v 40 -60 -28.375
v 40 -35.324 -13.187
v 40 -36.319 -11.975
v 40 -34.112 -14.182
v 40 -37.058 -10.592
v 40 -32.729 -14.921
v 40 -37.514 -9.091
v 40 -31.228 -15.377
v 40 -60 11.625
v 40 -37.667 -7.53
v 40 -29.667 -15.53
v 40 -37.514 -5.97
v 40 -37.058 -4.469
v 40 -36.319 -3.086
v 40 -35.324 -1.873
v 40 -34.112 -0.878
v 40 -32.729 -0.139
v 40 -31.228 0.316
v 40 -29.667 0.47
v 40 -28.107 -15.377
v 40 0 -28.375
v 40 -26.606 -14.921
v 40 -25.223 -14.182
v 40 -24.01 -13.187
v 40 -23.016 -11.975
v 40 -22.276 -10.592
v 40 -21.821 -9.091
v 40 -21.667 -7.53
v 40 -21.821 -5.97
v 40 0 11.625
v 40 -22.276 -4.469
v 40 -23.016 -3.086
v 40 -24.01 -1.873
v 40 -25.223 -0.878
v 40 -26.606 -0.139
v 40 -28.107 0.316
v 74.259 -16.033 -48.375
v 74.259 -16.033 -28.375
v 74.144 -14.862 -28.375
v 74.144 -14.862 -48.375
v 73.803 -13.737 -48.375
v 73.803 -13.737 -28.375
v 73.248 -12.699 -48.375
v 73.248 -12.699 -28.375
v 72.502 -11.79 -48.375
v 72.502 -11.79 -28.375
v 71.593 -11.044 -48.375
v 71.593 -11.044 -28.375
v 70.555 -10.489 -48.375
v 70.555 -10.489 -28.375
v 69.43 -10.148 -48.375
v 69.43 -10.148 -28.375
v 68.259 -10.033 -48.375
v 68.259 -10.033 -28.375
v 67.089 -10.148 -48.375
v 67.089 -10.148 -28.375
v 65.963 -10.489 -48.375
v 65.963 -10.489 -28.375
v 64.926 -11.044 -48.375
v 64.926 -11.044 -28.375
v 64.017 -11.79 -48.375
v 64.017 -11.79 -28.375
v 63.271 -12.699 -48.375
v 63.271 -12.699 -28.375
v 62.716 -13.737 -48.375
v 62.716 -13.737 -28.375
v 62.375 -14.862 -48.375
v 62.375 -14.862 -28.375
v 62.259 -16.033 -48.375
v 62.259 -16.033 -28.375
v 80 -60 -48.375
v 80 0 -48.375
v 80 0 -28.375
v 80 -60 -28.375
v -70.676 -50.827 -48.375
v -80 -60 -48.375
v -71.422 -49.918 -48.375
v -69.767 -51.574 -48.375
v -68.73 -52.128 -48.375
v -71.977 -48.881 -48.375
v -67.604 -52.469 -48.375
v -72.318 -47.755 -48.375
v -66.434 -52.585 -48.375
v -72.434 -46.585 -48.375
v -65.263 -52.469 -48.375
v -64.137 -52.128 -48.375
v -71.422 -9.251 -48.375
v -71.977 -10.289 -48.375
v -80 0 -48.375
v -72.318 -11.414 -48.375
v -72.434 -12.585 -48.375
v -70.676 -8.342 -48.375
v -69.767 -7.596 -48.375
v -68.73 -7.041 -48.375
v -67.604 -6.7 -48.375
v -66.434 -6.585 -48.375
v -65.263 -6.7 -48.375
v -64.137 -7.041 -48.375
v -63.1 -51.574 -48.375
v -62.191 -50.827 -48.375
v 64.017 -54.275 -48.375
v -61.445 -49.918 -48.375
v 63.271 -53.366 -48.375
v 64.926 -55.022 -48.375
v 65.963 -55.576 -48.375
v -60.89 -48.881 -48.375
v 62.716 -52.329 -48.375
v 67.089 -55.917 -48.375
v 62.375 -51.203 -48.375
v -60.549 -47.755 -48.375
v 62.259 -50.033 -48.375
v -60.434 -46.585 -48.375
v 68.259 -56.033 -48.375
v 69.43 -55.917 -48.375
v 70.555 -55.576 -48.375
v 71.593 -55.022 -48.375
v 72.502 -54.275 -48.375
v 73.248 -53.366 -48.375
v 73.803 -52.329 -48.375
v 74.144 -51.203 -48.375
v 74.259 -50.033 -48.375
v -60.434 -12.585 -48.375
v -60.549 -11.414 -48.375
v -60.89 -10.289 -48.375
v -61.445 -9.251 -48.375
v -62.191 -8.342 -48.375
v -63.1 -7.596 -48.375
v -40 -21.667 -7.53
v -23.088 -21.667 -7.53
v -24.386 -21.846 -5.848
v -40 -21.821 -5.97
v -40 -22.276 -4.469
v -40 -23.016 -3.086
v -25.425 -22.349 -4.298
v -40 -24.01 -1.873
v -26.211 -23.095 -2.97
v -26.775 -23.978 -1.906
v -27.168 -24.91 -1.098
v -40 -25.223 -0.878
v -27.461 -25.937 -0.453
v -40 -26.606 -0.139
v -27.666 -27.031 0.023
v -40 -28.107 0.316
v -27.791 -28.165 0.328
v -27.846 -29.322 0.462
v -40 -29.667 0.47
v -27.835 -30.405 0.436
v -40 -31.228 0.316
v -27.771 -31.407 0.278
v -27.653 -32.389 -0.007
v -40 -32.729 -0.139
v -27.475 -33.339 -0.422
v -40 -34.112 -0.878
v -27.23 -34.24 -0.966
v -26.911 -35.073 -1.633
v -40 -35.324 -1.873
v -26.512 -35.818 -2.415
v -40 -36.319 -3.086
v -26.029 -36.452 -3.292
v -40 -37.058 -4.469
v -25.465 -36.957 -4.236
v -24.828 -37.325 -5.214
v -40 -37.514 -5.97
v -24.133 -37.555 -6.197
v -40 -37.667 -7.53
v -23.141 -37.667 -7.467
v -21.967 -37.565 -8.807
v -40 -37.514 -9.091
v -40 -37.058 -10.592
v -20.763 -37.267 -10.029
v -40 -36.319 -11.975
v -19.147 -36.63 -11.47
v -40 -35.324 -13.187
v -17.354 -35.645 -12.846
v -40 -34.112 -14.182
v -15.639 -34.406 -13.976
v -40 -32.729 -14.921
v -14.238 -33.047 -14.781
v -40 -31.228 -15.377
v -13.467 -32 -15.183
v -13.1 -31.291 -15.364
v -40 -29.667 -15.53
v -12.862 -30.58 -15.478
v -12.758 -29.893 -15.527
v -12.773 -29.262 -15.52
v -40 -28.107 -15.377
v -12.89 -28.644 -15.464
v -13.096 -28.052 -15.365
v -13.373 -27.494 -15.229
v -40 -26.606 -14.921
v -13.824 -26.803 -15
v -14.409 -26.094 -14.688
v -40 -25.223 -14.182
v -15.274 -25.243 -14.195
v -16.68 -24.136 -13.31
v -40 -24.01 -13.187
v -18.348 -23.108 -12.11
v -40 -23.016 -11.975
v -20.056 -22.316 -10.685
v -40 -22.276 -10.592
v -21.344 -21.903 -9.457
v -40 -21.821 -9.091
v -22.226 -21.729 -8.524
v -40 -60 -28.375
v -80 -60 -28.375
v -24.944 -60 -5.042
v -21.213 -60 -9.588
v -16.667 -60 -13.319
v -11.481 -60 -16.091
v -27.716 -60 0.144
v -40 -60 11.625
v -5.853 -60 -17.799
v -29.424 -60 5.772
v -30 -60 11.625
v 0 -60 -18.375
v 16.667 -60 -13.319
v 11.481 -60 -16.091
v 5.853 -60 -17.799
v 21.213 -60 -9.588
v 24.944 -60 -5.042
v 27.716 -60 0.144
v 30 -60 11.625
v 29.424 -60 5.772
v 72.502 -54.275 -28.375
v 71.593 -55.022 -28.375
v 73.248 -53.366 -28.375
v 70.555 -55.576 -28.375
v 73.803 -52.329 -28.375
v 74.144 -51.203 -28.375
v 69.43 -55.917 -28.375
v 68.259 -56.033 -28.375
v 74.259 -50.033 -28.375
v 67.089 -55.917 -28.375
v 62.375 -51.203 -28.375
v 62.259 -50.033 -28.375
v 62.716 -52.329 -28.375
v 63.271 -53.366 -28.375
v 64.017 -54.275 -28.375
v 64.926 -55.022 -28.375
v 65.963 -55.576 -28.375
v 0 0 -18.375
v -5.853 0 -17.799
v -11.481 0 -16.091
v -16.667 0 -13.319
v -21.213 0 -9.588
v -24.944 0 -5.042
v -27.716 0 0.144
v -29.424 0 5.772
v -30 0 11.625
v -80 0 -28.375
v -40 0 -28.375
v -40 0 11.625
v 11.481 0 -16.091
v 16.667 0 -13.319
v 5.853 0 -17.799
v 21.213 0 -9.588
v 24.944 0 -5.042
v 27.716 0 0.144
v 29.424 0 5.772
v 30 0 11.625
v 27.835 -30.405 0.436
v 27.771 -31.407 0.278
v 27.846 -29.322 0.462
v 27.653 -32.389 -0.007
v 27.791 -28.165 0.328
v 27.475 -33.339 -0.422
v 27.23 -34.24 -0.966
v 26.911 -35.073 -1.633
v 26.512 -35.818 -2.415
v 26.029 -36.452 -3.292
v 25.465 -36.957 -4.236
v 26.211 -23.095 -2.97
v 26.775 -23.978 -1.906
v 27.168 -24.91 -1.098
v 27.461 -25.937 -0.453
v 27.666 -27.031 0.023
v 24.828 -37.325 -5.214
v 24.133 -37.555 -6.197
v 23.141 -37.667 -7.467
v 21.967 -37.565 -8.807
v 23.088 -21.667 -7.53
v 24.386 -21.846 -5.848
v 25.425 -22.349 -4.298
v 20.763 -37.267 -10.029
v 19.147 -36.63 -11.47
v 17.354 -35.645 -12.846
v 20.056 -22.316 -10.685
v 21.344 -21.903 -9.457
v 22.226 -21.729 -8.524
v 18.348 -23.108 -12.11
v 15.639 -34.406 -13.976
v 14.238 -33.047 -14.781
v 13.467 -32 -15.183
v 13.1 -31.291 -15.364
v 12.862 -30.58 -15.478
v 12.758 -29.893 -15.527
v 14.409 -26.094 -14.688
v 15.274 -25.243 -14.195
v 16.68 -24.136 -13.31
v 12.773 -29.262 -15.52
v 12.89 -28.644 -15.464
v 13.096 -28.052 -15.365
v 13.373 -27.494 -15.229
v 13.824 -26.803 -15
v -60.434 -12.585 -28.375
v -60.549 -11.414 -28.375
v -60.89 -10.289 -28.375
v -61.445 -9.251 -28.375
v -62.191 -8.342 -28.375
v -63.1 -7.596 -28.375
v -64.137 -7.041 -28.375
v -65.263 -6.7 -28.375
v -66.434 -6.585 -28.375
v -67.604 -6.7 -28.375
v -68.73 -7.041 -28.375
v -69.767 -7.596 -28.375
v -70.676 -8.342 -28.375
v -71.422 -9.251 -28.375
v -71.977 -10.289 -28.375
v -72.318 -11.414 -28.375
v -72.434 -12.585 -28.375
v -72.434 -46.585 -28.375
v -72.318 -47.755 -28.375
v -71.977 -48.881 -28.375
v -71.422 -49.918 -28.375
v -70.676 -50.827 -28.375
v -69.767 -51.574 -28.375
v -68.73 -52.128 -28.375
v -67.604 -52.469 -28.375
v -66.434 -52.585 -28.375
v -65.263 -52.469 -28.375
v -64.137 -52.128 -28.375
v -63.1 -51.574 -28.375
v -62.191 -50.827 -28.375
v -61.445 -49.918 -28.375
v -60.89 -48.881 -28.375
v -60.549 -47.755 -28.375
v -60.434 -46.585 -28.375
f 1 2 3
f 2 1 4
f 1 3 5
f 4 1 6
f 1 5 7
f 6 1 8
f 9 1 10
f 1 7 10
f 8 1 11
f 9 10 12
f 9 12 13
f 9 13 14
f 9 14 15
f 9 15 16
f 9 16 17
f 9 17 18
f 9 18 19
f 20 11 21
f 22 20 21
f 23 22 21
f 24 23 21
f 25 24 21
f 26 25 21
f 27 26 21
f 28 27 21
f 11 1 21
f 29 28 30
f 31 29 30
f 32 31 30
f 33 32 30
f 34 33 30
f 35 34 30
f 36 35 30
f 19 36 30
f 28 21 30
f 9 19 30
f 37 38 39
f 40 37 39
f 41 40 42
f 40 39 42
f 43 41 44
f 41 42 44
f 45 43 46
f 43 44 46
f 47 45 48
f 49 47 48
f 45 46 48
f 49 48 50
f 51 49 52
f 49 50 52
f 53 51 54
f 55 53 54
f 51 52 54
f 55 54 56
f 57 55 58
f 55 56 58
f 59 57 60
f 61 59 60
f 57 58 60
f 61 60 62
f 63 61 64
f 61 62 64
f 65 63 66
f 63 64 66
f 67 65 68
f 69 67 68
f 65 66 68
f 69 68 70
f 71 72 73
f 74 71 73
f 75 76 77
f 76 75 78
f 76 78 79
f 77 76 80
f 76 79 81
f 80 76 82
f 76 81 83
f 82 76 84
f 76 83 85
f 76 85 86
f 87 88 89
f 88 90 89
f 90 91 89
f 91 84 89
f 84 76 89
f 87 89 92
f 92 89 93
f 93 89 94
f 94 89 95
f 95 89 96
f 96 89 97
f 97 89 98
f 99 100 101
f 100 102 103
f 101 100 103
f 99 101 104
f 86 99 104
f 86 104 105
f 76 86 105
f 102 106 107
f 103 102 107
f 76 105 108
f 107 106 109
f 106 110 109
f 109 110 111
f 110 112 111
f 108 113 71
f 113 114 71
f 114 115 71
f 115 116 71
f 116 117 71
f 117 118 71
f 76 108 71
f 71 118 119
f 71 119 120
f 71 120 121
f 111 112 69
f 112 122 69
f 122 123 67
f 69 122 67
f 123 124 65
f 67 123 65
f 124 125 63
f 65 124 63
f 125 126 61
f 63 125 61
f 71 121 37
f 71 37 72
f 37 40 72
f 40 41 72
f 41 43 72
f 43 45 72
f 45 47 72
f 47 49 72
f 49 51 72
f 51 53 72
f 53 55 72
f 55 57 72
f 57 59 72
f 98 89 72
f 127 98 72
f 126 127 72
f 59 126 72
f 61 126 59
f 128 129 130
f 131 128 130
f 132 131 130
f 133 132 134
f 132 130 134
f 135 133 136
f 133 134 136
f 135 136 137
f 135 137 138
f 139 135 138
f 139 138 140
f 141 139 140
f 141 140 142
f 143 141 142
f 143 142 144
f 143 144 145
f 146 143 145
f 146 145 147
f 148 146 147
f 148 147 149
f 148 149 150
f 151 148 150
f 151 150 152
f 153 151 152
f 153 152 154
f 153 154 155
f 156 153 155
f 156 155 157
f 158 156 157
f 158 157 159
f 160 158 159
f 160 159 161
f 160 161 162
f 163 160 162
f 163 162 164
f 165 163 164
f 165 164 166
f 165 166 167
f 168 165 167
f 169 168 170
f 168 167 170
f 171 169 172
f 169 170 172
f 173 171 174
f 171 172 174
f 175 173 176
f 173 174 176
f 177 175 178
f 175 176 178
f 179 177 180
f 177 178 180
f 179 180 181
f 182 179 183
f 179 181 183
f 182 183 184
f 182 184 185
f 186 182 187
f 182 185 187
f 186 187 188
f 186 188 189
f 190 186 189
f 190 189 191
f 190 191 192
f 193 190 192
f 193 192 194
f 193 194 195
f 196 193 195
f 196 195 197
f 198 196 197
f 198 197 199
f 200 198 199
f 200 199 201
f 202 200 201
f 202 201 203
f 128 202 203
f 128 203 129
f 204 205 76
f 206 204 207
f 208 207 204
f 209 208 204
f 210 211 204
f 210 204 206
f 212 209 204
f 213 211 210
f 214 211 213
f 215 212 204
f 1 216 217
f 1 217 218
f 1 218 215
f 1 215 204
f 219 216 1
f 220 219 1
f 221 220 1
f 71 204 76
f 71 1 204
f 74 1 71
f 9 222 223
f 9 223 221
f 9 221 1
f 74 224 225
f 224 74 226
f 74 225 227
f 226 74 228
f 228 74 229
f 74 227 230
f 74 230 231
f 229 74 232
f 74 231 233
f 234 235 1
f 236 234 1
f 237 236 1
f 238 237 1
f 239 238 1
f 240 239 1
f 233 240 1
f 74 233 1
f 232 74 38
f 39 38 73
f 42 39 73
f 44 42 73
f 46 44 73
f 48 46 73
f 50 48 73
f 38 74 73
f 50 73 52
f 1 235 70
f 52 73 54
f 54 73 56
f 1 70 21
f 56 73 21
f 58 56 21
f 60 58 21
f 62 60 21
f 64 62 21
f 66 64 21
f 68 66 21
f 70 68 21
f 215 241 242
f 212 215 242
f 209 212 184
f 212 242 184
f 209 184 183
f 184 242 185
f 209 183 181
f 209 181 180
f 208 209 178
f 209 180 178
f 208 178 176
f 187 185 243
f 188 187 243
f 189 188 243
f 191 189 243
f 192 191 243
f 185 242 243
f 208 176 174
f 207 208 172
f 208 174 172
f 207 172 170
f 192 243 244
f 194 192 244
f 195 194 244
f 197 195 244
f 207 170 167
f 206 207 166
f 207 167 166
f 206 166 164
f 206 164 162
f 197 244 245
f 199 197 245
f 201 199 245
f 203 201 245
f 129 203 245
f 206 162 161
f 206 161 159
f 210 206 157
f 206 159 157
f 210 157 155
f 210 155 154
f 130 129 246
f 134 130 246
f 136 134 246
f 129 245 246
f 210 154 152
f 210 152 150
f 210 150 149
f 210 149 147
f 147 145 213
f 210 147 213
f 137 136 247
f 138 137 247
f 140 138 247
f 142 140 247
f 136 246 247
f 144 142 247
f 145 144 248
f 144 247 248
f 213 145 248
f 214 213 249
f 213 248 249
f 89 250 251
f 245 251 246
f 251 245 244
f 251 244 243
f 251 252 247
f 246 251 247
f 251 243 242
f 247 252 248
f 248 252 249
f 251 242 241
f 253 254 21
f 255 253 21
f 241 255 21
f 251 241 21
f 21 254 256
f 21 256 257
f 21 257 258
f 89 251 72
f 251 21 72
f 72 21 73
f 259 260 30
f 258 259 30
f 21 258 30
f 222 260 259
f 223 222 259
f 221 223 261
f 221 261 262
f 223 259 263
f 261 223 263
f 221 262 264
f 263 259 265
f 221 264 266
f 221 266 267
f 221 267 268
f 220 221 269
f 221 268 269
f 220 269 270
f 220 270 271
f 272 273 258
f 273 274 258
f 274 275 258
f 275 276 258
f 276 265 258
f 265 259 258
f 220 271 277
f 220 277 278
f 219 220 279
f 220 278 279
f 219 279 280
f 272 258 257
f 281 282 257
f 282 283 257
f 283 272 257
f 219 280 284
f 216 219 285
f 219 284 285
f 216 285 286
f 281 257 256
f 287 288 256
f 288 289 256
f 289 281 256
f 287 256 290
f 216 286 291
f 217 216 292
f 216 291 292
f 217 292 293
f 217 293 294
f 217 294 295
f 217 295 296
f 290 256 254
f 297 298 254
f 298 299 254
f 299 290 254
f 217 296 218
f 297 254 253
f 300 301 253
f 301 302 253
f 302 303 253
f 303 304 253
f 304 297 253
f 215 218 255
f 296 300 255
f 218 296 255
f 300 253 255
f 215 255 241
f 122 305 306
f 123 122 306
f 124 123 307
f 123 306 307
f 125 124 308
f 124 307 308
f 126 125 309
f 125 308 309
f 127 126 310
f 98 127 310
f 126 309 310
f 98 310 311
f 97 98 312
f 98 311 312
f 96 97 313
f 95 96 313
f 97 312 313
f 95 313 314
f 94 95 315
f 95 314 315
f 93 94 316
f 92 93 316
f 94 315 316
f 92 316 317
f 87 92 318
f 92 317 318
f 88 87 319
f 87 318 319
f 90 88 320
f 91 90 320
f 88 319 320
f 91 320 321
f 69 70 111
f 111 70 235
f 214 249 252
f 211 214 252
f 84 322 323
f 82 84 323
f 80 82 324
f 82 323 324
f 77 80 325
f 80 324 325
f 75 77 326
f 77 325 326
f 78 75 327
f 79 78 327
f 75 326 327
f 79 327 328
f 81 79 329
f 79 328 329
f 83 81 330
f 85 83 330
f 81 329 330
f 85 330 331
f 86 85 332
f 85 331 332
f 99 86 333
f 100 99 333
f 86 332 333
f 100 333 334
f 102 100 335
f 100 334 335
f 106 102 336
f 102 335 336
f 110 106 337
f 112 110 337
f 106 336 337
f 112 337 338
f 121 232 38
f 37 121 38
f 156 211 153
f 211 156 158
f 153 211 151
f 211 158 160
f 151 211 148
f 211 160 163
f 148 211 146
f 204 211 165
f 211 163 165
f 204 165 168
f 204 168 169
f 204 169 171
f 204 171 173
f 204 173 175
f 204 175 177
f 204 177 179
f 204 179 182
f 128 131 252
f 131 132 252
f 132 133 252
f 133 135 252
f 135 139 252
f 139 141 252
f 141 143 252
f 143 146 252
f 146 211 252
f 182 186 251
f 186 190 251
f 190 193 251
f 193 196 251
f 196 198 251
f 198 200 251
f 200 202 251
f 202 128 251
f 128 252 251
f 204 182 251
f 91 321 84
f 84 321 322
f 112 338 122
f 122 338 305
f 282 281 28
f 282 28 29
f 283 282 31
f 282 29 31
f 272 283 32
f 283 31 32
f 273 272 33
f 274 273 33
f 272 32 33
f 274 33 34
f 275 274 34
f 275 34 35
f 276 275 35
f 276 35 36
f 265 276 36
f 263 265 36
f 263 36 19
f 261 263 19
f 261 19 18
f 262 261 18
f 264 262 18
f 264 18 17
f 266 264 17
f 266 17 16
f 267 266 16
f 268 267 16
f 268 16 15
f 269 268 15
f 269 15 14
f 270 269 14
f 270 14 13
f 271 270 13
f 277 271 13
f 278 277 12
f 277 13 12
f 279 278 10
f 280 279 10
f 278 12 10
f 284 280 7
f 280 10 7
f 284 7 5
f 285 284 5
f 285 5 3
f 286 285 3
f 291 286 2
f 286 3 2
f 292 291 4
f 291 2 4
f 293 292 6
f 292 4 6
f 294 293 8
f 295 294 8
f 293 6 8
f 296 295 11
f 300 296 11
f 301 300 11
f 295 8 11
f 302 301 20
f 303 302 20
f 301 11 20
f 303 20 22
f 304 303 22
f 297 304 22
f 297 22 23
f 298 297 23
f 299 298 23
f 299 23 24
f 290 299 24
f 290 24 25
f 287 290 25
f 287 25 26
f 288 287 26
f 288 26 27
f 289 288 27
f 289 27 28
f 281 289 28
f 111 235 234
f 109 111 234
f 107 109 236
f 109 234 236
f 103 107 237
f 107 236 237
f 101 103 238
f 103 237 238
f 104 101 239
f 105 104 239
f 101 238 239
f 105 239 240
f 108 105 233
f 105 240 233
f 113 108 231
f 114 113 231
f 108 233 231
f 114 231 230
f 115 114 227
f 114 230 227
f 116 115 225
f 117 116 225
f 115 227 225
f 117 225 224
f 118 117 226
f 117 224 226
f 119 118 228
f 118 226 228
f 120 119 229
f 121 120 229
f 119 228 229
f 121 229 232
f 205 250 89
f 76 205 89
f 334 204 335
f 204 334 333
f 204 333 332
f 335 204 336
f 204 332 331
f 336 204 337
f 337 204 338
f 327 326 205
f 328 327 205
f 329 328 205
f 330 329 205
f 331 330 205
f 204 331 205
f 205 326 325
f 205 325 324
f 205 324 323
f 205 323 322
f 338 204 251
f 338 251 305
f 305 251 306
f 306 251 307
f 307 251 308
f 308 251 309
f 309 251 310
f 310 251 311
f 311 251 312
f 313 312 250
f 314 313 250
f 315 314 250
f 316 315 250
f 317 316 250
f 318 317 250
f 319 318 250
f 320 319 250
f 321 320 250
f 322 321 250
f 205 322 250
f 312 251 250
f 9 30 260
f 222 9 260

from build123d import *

# Parameters (mm, degrees)
F1_DEPTH = 60
F4_DEPTH = 20.001
F5_R     = 8
F6_DEPTH = 120.001


with BuildPart() as f1:
    # F0 (on Front) → F1 (new body)
    with BuildSketch(Plane.XZ):
        Polygon((-40, -28.375002), (-80, -28.375002), (-80, -48.375002), (80, -48.375002), (80, -28.375002), (40, -28.375002), (0, -28.375002), align=None)
        with BuildLine():
            Line((-40, 11.624998), (-40, -28.375002))
            Line((-40, -28.375002), (0, -28.375002))
            Line((0, -28.375002), (0, -18.375002))
            ThreePointArc((0, -18.375002), (-21.213203, -9.588205), (-30, 11.624998))
            Line((-30, 11.624998), (-40, 11.624998))
        make_face()
        with BuildLine():
            Line((0, -18.375002), (0, -28.375002))
            Line((0, -28.375002), (40, -28.375002))
            Line((40, -28.375002), (40, 11.624998))
            Line((40, 11.624998), (30, 11.624998))
            ThreePointArc((30, 11.624998), (21.213203, -9.588205), (0, -18.375002))
        make_face()
    extrude(amount=F1_DEPTH)

    # F3 (on face) → F4 (cut, through all)
    with BuildSketch(Plane.XY.offset(-28.375002)):
        with BuildLine():
            ThreePointArc((-60.433533, -12.584707), (-66.433533, -6.584707), (-72.433533, -12.584707))
            Line((-72.433533, -12.584707), (-72.433533, -46.584707))
            ThreePointArc((-72.433533, -46.584707), (-66.433533, -52.584707), (-60.433533, -46.584707))
            Line((-60.433533, -46.584707), (-60.433533, -12.584707))
        make_face()
        with BuildLine():
            ThreePointArc((62.259354, -50.032701), (68.259354, -56.032701), (74.259354, -50.032701))
            Line((74.259354, -50.032701), (74.259354, -16.032701))
            ThreePointArc((74.259354, -16.032701), (68.259354, -10.032701), (62.259354, -16.032701))
            Line((62.259354, -16.032701), (62.259354, -50.032701))
        make_face()
    extrude(amount=-F4_DEPTH, mode=Mode.SUBTRACT)

    # F5 (on face) → F6 (cut, through all)
    with BuildSketch(Plane.YZ.offset(40)):
        with Locations((-29.667338, -7.530242)):
            Circle(F5_R)
    extrude(amount=-F6_DEPTH, mode=Mode.SUBTRACT)


solid = f1.part
